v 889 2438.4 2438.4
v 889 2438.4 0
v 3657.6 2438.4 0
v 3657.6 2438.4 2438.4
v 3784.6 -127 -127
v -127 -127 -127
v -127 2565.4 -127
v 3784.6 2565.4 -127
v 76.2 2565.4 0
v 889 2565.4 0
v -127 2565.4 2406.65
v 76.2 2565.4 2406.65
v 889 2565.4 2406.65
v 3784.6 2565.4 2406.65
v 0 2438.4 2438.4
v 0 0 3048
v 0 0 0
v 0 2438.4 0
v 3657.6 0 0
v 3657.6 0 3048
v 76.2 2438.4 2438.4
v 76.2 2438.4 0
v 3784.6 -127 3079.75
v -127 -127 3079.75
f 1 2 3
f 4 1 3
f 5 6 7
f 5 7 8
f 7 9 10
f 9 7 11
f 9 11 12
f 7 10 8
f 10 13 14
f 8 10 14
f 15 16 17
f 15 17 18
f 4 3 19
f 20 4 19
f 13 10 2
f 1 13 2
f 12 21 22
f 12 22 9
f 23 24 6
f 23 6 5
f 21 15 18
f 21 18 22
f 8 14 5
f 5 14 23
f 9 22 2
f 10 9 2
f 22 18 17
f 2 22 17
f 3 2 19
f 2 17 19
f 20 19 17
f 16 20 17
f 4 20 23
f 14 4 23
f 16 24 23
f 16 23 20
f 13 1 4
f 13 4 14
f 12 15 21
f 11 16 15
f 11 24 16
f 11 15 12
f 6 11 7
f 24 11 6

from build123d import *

# Parameters (mm, degrees)
F3_REACH = 7828.3953141922
F4_W     = 3911.6
F4_H     = 2692.4
F5_DEPTH = 127


with BuildPart() as f3:
    f3_end = Plane(origin=(0, 717.1764705882, 2868.7058823529), x_dir=(0, 0.9701425001, -0.242535625), z_dir=(0, 0.242535625, 0.9701425001))
    # F0 (on Top) → F3 (new body, up to a plane its end follows)
    with BuildSketch(Plane.XY):
        Polygon((3657.6, 0), (0, 0), (0, 2438.4), (76.2, 2438.4), (76.2, 2565.4), (-127, 2565.4), (-127, -127), (3784.6, -127), (3784.6, 2565.4), (889, 2565.4), (889, 2438.4), (3657.6, 2438.4), align=None)
    f3_long = extrude(amount=F3_REACH, mode=Mode.PRIVATE)
    add(split(f3_long, bisect_by=f3_end, keep=Keep.BOTTOM, mode=Mode.PRIVATE))

    # F4 (on face) → F5 (join)
    with BuildSketch(Plane(origin=(0, 0, 0), x_dir=(1, 0, 0), z_dir=(0, 0, -1))):
        with Locations((1828.8, -1219.2)):
            Rectangle(F4_W, F4_H)
    extrude(amount=F5_DEPTH)


solid = f3.part
